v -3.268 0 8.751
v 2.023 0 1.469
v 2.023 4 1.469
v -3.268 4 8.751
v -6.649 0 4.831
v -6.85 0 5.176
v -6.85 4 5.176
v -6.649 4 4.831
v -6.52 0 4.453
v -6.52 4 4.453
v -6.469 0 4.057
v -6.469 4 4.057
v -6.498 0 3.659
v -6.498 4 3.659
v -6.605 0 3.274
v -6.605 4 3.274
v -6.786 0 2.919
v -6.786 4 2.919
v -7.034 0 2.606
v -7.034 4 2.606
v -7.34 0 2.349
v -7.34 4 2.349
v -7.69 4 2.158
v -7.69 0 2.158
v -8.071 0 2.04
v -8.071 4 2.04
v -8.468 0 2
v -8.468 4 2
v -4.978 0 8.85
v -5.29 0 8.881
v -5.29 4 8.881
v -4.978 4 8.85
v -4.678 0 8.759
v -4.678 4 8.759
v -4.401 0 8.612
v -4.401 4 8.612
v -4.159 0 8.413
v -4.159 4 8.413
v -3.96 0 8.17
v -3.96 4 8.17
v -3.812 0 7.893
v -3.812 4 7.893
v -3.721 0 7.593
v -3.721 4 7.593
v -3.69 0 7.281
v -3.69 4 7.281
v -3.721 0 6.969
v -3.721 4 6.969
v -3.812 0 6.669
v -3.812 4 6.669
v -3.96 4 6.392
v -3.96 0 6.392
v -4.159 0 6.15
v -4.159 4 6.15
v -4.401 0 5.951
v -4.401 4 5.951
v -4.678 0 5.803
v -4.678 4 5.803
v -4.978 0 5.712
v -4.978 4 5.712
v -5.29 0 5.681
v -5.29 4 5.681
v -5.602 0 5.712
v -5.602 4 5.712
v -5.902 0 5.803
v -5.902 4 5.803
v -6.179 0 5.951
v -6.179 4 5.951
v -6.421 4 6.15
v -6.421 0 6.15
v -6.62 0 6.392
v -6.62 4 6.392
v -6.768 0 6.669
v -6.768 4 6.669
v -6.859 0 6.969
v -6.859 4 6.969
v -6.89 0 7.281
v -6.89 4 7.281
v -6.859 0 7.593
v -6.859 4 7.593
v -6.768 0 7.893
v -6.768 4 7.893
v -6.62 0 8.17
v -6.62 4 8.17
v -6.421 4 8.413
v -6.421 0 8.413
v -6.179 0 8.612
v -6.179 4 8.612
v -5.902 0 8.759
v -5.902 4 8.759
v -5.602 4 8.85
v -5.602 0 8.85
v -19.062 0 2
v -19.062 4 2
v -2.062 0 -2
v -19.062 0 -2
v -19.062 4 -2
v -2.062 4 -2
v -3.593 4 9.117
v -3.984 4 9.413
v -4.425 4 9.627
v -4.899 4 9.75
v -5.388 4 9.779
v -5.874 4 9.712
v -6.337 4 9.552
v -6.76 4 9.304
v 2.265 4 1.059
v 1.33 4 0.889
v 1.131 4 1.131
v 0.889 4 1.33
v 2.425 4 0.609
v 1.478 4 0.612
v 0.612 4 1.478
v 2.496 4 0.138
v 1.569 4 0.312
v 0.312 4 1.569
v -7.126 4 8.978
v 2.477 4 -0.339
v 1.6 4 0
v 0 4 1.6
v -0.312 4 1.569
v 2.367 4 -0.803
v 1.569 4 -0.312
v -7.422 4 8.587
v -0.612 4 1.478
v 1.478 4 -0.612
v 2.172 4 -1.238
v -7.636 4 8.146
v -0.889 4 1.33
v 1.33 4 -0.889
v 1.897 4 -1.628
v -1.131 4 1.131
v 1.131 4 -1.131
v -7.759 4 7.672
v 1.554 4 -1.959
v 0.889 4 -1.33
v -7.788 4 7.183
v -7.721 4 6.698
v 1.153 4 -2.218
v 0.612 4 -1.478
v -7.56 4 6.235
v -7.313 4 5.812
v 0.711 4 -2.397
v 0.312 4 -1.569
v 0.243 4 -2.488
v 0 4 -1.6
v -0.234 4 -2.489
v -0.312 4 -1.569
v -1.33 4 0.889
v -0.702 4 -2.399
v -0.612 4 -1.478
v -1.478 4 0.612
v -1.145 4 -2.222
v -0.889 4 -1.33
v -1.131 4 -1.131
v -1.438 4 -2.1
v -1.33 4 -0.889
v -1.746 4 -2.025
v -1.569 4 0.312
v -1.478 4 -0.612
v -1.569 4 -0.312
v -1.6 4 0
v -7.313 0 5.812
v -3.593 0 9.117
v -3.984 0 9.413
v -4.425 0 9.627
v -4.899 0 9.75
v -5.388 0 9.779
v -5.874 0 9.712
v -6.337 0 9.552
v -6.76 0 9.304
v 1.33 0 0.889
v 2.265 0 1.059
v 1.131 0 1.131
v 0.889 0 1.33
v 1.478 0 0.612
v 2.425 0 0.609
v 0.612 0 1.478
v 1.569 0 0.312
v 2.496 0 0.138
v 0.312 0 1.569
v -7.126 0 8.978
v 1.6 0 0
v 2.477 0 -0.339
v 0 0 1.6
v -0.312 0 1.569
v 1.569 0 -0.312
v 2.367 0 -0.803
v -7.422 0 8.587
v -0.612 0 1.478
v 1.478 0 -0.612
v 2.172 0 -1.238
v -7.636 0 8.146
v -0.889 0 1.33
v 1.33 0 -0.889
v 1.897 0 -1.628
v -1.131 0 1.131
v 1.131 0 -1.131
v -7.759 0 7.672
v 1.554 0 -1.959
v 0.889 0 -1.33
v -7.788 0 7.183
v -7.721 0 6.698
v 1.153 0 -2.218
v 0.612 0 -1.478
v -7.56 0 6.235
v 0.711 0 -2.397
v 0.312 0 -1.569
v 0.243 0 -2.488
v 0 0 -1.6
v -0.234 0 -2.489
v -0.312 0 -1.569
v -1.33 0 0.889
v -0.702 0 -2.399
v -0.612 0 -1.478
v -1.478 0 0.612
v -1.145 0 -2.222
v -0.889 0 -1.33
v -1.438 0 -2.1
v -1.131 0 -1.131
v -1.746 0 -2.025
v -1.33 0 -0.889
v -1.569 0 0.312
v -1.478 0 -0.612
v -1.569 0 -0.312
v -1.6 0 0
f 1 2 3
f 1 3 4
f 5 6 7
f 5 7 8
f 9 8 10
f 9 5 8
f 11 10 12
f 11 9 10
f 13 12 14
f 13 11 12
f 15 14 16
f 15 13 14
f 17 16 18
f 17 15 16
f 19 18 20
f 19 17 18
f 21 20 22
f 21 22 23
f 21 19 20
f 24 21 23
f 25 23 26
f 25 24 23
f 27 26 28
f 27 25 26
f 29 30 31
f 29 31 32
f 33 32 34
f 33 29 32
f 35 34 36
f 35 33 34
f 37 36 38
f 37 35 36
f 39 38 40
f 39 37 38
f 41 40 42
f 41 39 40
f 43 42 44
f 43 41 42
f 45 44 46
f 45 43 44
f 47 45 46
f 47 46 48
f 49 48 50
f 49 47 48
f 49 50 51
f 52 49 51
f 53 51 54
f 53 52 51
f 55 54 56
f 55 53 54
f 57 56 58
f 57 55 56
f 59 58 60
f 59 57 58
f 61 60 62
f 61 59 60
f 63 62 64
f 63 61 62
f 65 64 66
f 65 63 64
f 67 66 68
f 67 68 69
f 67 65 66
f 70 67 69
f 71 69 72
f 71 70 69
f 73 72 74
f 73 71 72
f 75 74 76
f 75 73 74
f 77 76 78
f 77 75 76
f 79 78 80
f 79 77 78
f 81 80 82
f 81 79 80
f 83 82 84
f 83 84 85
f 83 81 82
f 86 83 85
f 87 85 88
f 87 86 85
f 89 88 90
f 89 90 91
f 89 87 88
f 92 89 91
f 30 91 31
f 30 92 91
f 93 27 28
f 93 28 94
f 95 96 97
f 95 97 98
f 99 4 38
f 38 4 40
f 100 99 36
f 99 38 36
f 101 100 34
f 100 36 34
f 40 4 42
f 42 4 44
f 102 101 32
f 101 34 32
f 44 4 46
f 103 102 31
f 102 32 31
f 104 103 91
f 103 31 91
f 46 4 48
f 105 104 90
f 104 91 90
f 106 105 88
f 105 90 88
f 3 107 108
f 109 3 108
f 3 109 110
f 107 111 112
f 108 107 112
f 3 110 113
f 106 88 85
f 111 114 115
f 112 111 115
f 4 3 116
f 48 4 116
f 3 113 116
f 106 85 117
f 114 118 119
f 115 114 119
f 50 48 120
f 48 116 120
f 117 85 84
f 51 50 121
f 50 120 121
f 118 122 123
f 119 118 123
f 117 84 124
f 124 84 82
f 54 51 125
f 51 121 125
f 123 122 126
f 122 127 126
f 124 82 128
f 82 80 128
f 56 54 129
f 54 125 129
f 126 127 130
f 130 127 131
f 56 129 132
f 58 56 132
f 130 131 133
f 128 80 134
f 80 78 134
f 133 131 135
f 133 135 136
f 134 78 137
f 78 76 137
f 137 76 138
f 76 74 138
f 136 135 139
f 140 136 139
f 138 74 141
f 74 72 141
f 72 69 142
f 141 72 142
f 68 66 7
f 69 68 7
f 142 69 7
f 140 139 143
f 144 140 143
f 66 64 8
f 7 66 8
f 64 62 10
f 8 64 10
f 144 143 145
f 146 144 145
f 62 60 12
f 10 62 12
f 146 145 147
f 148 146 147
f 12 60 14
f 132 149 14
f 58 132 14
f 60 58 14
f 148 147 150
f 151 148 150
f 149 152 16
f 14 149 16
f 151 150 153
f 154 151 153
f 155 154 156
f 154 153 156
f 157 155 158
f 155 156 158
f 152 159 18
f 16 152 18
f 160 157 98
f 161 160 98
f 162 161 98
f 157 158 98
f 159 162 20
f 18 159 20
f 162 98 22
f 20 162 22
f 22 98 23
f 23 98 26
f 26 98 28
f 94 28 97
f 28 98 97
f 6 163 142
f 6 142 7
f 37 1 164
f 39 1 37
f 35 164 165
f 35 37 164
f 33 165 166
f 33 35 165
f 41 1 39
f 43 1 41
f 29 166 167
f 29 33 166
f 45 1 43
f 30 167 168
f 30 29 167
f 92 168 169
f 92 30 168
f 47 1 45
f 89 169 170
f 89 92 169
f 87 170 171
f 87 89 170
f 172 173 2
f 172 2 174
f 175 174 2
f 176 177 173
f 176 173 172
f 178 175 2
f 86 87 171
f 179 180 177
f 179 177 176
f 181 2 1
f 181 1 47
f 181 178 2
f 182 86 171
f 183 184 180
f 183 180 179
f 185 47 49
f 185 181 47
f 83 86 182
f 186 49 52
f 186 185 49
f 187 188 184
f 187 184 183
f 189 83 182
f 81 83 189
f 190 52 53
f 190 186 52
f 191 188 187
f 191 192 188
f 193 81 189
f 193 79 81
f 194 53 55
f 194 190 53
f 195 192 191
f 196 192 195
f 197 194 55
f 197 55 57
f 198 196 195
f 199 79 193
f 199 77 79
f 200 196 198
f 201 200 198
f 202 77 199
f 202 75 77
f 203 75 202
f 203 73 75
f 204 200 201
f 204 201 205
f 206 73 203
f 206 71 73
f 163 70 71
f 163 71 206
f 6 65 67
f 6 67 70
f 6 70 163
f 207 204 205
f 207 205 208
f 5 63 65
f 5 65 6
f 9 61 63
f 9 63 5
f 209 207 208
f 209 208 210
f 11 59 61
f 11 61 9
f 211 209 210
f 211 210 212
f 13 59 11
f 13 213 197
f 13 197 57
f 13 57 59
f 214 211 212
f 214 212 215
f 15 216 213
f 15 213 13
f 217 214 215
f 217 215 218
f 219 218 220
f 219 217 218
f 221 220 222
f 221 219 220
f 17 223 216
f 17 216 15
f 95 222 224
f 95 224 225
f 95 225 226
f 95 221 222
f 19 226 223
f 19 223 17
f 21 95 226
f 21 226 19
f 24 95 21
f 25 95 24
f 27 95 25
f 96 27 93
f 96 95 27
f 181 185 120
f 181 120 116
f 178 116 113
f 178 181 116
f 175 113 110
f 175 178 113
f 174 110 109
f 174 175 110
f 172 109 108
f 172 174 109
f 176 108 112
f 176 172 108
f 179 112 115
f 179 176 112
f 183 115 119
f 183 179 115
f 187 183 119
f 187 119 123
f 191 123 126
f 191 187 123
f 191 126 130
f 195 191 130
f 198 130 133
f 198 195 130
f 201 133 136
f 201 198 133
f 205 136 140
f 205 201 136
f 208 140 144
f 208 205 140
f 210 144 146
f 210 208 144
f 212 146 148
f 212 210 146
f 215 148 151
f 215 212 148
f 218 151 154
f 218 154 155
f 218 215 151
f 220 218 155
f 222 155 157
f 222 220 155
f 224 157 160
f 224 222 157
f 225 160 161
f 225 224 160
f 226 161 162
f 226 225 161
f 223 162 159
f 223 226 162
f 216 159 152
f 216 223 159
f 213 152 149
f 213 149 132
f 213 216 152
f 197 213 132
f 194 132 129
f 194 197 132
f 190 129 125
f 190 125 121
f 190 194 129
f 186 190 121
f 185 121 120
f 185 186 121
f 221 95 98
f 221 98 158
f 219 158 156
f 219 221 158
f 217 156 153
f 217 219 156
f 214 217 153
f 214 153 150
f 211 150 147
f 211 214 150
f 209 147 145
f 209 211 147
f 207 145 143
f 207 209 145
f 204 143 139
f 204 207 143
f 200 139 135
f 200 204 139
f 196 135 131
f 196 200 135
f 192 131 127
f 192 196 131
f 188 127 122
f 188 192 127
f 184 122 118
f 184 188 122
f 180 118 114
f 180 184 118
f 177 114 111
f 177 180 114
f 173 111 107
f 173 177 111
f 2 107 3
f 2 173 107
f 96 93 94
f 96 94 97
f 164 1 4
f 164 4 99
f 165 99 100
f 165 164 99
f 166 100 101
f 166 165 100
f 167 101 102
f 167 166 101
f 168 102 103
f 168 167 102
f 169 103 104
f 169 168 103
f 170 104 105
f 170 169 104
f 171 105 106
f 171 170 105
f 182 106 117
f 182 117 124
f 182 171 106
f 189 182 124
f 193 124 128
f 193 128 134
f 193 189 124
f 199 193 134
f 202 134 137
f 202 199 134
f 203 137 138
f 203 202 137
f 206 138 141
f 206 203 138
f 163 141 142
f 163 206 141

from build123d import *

# Parameters (mm, degrees)
SKETCH_2_R      = 1.6
EXTRUDE_1_DEPTH = 4


with BuildPart() as part:
    # ｽｹｯﾁ2 → ﾎﾞｽ - 押し出し1 (new body)
    with BuildSketch(Plane(origin=(0, 0, 0), x_dir=(1, 0, 0), z_dir=(0, 1, 0))):
        with BuildLine():
            Line((2.022542486, -1.469463131), (-3.267524785, -8.75061608))
            ThreePointArc((-3.267524785, -8.75061608), (-6.759530401, -9.303695435), (-7.312609757, -5.811689819))
            Line((-7.312609757, -5.811689819), (-6.850442022, -5.175570505))
            ThreePointArc((-6.850442022, -5.175570505), (-6.686462962, -3.092019001), (-8.468476011, -2))
            Line((-8.468476011, -2), (-19.061552813, -2))
            Line((-19.061552813, -2), (-19.061552813, 2))
            Line((-19.061552813, 2), (-2.061552813, 2))
            ThreePointArc((-2.061552813, 2), (-1.590148292, 2.056349368), (-1.145307118, 2.222222222))
            ThreePointArc((-1.145307118, 2.222222222), (1.897240274, 1.628029281), (2.022542486, -1.469463131))
        make_face()
        with Locations(Location((0, 0, 0), (0, 0, 270))):
            Circle(SKETCH_2_R, mode=Mode.SUBTRACT)
        with Locations(Location((-5.290067271, -7.281152949, 0), (0, 0, 270))):
            Circle(SKETCH_2_R, mode=Mode.SUBTRACT)
    extrude(amount=EXTRUDE_1_DEPTH)


solid = part.part
